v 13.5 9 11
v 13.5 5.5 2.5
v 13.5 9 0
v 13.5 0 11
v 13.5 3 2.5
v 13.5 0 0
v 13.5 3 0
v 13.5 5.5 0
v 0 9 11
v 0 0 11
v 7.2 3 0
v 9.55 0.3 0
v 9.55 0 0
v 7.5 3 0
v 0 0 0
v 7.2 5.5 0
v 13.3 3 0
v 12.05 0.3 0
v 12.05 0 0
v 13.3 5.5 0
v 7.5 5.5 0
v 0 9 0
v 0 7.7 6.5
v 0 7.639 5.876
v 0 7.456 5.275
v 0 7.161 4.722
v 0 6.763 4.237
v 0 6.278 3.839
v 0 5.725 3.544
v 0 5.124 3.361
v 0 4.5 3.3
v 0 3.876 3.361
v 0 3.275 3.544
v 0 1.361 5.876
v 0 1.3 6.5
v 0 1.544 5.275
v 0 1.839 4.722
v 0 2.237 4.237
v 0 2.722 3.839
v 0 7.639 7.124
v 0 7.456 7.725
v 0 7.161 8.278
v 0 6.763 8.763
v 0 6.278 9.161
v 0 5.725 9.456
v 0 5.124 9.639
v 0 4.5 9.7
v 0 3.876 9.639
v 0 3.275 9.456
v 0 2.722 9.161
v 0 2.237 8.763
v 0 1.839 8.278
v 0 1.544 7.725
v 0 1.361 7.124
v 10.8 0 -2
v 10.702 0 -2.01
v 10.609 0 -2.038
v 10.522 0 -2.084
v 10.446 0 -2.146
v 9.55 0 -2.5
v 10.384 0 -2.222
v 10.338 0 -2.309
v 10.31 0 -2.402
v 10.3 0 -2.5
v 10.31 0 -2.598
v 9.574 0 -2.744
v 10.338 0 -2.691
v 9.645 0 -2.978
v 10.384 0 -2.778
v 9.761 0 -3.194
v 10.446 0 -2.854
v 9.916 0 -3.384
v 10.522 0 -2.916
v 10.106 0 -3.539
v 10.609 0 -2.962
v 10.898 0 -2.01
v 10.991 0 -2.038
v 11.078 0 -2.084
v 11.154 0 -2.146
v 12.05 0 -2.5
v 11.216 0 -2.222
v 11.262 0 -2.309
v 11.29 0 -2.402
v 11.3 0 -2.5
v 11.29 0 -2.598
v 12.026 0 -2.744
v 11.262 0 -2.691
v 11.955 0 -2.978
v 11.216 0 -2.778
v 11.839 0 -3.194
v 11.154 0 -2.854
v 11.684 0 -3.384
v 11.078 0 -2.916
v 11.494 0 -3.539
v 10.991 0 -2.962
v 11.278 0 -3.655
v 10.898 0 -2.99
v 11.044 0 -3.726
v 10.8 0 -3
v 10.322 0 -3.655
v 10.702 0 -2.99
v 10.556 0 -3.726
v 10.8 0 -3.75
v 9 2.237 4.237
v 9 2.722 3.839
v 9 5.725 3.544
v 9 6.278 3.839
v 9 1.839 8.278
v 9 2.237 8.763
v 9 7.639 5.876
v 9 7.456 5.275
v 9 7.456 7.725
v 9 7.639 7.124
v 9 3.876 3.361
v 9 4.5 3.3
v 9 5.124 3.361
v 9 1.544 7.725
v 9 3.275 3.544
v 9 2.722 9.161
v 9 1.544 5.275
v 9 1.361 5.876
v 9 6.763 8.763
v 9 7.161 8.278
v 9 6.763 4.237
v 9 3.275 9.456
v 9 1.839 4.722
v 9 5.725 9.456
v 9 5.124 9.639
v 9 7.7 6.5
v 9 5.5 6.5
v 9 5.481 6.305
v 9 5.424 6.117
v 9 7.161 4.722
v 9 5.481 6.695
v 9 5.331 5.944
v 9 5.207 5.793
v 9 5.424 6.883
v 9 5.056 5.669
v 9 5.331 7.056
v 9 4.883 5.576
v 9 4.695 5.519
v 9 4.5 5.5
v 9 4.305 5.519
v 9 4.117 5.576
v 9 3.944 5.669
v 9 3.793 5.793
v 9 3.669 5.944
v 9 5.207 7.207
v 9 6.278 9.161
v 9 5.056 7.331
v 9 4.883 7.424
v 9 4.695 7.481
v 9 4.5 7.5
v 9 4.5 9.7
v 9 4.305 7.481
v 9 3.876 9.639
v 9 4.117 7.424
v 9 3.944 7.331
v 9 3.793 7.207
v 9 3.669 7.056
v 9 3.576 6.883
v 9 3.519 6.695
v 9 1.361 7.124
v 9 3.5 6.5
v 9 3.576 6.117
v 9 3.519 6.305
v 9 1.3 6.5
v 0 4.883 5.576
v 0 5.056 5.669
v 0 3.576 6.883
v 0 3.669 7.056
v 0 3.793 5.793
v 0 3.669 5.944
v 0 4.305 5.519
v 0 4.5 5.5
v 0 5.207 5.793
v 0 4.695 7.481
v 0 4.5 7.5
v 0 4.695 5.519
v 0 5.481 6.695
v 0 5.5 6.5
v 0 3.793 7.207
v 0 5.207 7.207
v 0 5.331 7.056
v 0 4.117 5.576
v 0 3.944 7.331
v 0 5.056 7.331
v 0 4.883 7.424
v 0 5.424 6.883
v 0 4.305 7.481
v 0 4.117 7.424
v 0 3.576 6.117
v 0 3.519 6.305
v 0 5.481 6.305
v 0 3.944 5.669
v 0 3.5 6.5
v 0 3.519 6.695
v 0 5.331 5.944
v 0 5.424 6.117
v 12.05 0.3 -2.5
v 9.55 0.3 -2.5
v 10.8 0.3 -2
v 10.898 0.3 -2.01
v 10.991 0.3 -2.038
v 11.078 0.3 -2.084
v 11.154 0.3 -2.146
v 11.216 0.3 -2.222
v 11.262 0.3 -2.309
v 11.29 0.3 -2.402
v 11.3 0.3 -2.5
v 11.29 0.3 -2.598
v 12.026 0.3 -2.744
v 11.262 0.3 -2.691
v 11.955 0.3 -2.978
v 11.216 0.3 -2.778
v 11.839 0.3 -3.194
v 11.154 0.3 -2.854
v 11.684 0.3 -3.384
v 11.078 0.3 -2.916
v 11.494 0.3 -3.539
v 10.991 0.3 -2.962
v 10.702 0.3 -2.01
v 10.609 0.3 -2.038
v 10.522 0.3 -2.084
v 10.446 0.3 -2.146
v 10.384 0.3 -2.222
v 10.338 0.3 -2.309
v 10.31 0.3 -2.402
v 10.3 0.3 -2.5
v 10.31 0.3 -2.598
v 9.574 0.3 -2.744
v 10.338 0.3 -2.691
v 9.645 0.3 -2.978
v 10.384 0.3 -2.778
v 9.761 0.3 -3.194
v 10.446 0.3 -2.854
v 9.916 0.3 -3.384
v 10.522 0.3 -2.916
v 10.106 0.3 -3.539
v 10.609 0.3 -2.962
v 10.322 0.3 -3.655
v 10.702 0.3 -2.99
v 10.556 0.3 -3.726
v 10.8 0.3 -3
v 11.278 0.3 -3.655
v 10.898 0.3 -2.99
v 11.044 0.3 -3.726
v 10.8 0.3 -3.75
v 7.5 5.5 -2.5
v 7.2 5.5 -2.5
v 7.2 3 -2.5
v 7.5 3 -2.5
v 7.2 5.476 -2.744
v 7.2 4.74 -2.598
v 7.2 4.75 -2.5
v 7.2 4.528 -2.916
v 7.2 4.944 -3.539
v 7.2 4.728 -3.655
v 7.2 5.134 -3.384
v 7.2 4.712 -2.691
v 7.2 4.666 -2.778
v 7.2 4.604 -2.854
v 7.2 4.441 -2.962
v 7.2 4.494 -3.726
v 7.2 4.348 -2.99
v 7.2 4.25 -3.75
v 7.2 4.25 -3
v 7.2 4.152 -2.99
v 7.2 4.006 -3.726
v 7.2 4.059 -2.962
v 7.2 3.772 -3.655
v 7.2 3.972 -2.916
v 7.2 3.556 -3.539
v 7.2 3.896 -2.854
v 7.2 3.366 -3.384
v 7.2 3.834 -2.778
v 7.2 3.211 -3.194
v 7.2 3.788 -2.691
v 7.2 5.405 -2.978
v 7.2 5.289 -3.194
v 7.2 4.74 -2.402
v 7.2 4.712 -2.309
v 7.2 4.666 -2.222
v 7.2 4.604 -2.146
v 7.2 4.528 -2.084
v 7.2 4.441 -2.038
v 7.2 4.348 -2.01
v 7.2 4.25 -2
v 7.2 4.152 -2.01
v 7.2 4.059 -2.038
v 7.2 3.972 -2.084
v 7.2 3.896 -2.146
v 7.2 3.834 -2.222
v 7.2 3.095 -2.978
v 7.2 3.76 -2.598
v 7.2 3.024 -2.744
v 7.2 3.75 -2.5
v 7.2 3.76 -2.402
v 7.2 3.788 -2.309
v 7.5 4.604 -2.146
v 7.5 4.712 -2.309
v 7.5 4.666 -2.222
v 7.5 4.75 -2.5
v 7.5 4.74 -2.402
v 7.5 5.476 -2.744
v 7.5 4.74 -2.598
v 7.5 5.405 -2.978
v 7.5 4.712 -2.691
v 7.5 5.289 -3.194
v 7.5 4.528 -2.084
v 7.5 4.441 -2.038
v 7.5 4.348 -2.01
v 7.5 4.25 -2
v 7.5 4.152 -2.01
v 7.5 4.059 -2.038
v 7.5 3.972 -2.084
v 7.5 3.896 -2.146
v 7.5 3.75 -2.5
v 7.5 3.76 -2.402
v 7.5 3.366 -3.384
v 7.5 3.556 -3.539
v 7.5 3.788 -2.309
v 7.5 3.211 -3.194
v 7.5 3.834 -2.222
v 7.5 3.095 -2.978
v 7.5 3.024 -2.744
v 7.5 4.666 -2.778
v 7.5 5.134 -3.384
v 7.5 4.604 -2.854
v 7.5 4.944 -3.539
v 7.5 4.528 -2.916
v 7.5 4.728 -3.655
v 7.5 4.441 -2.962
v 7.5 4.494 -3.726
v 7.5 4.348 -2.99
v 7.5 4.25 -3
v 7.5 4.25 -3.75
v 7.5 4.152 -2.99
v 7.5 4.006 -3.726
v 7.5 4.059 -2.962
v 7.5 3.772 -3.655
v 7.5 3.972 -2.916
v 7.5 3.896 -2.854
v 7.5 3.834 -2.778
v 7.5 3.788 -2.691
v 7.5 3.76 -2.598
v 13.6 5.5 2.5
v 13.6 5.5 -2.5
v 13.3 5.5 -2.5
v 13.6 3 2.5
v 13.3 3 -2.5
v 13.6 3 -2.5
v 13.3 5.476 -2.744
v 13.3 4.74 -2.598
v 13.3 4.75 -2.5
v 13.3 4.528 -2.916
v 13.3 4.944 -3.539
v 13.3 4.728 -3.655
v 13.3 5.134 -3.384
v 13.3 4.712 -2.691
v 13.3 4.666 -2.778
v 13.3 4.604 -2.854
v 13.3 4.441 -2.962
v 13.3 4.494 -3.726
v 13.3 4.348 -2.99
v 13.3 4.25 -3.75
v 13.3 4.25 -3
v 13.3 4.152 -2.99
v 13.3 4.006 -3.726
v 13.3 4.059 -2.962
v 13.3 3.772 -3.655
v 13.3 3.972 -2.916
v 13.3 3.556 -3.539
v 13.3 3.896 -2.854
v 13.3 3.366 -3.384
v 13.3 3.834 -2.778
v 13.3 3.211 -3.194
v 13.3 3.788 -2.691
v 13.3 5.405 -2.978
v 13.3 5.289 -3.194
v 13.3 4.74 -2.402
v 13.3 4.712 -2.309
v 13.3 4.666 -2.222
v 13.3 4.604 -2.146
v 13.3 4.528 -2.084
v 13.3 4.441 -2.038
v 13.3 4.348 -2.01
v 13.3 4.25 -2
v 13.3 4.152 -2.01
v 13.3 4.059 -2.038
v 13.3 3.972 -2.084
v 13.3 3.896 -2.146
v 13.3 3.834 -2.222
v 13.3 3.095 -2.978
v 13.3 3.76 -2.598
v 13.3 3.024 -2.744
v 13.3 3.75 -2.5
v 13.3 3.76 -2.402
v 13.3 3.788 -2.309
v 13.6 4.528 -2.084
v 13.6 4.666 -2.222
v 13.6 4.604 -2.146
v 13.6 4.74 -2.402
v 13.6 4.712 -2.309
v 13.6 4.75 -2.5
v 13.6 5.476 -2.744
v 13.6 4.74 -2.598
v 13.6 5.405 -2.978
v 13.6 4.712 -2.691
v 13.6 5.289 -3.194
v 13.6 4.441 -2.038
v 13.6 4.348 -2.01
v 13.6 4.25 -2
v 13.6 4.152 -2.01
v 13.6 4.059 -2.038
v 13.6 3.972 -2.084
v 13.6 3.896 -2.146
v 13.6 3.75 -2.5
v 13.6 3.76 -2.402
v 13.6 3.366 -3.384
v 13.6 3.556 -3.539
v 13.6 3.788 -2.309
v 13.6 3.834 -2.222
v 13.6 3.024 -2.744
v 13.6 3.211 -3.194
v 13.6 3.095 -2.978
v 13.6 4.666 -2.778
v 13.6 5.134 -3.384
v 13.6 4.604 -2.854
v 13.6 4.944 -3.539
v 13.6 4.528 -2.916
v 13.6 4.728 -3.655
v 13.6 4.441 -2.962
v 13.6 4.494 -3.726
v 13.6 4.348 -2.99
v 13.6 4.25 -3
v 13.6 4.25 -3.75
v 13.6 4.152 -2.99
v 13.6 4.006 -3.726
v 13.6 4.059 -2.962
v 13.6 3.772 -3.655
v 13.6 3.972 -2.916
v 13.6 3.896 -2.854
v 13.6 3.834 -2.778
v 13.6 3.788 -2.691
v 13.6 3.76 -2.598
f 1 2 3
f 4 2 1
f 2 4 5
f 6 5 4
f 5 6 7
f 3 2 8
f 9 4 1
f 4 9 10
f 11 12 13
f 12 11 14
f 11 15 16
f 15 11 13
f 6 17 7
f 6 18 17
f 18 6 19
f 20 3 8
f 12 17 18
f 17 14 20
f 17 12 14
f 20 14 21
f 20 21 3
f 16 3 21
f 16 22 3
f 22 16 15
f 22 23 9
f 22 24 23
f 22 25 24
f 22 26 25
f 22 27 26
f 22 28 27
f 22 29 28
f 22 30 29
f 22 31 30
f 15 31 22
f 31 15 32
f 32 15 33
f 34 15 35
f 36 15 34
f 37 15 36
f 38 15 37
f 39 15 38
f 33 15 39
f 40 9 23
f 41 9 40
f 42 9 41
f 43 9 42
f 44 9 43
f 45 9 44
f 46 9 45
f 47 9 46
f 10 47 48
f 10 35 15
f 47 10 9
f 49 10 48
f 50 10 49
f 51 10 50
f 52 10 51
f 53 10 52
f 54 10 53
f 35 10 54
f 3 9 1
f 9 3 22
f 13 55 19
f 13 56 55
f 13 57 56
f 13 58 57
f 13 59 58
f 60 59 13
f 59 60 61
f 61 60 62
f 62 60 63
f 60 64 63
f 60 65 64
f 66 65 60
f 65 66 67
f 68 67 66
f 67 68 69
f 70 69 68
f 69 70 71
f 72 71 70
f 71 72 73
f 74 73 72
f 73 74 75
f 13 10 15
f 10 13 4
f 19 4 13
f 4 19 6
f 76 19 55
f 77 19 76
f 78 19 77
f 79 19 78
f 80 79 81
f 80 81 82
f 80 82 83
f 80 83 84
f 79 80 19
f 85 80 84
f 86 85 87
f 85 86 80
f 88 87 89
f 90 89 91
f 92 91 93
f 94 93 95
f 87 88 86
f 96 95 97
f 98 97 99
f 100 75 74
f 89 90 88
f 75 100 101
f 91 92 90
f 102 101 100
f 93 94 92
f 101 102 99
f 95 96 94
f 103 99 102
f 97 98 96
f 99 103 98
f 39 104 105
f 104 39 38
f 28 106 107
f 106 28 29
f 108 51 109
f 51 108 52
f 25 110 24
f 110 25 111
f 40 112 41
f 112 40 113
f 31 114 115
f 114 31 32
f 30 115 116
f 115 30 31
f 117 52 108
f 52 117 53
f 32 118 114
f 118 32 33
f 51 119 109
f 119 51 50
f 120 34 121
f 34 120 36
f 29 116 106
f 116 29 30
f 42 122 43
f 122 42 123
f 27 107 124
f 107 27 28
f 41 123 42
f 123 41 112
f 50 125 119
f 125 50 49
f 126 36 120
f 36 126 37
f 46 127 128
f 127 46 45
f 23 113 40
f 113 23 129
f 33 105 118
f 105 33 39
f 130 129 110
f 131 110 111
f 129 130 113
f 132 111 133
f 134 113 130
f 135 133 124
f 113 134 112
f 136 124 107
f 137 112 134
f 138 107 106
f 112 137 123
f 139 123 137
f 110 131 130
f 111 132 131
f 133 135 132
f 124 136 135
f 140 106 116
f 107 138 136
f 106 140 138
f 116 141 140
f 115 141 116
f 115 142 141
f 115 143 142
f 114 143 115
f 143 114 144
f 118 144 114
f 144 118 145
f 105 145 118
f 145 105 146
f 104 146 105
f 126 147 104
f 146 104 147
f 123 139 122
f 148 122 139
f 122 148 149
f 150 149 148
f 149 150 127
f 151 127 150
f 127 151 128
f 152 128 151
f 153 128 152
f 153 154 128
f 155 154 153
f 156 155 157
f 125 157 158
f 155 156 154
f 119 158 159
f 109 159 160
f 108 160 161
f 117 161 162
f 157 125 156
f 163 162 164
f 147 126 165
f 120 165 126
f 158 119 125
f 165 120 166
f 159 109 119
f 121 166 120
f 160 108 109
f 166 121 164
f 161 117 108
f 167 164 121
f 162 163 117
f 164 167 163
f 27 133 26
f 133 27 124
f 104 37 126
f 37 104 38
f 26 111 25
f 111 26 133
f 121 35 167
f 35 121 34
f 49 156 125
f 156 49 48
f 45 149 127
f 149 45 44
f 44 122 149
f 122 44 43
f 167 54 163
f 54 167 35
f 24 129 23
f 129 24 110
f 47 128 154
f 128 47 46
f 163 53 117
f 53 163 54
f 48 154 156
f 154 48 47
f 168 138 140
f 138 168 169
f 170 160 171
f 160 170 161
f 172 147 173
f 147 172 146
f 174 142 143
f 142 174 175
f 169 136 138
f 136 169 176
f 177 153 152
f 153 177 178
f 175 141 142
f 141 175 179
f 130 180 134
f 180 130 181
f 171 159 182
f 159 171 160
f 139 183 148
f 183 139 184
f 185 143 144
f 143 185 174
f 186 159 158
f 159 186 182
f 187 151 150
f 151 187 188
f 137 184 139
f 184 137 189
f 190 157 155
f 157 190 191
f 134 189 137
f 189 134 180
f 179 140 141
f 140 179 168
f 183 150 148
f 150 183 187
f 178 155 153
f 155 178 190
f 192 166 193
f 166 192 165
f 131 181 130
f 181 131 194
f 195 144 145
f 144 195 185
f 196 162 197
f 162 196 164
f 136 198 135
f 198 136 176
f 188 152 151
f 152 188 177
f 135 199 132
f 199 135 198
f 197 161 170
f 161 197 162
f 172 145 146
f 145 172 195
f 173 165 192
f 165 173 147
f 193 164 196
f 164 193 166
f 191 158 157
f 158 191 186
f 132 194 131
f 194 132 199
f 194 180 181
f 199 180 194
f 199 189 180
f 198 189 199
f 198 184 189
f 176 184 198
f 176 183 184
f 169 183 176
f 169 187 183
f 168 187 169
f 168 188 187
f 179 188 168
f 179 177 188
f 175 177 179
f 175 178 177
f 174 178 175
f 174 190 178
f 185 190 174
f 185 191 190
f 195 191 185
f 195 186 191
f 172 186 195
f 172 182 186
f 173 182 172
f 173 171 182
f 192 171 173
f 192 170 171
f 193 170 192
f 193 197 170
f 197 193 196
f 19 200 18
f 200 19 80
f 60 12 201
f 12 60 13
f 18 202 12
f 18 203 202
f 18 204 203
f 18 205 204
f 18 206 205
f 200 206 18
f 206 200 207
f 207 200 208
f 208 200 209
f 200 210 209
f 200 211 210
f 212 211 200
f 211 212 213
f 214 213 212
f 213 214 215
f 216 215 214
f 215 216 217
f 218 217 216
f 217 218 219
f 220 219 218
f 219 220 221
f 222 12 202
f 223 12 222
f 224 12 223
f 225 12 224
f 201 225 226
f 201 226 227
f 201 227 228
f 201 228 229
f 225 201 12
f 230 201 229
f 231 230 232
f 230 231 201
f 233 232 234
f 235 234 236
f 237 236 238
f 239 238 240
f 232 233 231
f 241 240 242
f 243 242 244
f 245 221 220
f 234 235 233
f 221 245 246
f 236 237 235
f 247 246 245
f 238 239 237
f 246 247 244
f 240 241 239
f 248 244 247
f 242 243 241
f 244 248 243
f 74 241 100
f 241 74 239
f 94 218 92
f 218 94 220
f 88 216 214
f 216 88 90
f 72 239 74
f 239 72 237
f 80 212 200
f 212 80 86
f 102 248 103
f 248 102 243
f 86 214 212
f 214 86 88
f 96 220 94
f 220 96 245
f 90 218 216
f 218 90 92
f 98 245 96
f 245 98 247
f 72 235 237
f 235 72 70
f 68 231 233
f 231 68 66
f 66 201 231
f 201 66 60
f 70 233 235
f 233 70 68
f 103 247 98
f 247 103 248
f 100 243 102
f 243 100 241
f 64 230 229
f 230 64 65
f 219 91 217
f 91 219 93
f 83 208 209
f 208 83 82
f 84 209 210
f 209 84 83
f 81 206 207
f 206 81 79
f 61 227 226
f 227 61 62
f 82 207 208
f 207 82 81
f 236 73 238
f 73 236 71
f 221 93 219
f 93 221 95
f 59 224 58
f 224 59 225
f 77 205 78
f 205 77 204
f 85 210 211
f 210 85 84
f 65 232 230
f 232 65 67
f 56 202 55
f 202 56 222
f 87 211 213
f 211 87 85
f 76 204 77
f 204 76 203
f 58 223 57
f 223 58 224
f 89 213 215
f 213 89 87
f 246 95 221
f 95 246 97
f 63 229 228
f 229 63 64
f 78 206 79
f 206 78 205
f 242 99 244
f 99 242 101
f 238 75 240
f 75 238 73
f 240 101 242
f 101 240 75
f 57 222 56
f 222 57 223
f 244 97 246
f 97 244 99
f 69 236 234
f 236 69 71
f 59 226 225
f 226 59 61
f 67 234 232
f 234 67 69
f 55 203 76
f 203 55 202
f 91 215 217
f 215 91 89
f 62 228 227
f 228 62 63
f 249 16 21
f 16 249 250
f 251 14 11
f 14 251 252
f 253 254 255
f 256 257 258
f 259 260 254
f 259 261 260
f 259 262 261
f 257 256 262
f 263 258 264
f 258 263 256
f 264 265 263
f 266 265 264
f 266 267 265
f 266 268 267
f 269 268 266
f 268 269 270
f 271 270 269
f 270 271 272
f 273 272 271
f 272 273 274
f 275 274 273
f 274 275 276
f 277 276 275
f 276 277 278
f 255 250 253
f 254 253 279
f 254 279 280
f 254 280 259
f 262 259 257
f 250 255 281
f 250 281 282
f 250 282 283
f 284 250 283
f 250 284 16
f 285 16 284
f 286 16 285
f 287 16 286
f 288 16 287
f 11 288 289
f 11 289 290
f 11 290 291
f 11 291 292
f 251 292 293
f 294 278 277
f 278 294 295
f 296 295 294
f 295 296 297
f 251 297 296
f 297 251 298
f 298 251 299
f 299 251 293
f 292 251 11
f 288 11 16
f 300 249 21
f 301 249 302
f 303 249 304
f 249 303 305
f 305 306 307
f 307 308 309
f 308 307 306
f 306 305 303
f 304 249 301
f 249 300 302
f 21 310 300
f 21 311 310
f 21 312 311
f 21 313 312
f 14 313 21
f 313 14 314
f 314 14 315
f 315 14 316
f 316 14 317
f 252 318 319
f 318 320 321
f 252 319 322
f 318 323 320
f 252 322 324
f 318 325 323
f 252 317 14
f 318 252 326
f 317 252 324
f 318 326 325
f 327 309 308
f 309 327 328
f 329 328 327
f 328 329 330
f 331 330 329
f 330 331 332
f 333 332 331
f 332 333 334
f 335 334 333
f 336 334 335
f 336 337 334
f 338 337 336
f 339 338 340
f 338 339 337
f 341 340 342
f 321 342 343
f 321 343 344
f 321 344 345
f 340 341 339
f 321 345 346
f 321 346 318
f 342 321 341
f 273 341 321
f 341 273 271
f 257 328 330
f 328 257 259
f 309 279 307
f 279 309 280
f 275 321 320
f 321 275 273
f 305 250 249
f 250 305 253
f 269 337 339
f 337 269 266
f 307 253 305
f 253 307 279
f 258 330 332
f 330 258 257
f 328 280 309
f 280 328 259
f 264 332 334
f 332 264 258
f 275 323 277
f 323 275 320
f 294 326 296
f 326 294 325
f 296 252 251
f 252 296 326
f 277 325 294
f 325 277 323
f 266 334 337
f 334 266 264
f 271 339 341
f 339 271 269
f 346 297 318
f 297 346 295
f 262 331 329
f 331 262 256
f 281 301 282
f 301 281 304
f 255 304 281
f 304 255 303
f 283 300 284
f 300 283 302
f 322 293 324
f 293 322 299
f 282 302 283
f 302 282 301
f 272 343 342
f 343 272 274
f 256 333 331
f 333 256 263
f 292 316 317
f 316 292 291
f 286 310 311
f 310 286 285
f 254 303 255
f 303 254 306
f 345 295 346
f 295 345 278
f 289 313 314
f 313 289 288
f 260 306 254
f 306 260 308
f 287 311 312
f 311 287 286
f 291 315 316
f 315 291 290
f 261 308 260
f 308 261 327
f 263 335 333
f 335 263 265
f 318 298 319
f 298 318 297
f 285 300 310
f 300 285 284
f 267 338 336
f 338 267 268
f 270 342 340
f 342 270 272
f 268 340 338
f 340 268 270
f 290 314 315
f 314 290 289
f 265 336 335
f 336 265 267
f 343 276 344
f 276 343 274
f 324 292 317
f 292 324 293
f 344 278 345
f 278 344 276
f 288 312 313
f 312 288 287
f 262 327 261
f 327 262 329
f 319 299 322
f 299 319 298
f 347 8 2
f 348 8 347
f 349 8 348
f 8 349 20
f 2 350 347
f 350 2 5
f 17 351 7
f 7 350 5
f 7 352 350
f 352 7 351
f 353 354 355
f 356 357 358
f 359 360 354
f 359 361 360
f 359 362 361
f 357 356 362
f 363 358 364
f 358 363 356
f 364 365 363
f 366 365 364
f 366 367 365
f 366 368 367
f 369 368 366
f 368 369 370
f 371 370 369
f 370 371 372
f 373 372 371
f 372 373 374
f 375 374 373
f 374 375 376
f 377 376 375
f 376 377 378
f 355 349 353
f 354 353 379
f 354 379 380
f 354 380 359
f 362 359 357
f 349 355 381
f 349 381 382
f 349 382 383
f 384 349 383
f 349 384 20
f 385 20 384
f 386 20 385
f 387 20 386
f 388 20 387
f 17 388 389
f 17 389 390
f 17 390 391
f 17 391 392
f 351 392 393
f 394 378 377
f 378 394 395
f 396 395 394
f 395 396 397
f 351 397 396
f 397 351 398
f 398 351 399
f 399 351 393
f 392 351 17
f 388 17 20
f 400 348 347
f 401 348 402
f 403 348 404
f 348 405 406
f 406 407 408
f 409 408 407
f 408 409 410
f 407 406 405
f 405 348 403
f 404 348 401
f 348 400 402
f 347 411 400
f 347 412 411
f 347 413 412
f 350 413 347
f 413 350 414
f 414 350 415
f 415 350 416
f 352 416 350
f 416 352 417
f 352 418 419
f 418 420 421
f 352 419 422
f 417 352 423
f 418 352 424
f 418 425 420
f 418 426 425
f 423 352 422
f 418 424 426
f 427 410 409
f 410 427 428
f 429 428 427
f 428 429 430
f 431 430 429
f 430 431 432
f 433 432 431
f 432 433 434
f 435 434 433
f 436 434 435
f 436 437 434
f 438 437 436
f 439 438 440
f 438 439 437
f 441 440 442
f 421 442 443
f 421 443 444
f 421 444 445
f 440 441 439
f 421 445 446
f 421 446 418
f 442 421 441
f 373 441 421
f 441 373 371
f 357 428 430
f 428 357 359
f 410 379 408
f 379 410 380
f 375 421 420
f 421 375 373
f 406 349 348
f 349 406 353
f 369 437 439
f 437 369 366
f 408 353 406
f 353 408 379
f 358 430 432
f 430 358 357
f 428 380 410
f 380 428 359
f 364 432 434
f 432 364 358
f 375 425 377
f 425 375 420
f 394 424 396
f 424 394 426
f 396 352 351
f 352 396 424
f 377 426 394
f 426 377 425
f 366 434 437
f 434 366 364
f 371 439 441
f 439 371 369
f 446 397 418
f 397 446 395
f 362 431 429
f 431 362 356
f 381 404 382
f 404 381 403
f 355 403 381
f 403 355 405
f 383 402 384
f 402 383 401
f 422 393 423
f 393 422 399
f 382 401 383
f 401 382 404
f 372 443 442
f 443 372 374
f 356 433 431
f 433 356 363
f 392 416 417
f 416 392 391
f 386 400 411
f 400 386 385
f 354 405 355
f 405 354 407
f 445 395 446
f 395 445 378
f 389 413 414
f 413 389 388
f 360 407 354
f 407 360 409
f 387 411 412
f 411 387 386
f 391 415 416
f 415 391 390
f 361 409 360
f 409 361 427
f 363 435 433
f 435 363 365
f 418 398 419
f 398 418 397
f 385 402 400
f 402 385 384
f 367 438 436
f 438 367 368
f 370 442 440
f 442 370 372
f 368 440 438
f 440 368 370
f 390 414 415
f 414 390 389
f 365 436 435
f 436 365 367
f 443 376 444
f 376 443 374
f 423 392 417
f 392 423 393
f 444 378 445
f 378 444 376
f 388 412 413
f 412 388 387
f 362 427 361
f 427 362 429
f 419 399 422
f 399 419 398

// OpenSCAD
$fn=32;

tlen=2.5;

module tab() {
  difference() {
      union() {
        cube( [2.5, 0.3, 5]);
        translate( [1.25, 0.3, 0])
            rotate( [90, 0, 0])
                cylinder( 0.3, 1.25, 1.25);
      }
      translate( [1.25, 0.35, 0])
         rotate( [90, 0, 0])
            cylinder( 1, 0.5, 0.5);
  }
}

union() {
    difference() {
        cube( [13.5, 9, 11]);
        translate( [-1, 4.5, 6.5])
        rotate( [0, 90, 0])
        cylinder( 10, 3.2, 3.2);
    }
    translate( [0, 4.5, 6.5]) {
        rotate( [0, 90, 0])
            cylinder( 11, 1, 1);
    }
}

translate( [10.8-(2.5/2), 0, -tlen])
    tab();
translate( [7.5, 3, -tlen])
    rotate( [0, 0, 90])
        tab();
translate( [13.6, 3, -tlen])
    rotate( [0, 0, 90])
        tab();
